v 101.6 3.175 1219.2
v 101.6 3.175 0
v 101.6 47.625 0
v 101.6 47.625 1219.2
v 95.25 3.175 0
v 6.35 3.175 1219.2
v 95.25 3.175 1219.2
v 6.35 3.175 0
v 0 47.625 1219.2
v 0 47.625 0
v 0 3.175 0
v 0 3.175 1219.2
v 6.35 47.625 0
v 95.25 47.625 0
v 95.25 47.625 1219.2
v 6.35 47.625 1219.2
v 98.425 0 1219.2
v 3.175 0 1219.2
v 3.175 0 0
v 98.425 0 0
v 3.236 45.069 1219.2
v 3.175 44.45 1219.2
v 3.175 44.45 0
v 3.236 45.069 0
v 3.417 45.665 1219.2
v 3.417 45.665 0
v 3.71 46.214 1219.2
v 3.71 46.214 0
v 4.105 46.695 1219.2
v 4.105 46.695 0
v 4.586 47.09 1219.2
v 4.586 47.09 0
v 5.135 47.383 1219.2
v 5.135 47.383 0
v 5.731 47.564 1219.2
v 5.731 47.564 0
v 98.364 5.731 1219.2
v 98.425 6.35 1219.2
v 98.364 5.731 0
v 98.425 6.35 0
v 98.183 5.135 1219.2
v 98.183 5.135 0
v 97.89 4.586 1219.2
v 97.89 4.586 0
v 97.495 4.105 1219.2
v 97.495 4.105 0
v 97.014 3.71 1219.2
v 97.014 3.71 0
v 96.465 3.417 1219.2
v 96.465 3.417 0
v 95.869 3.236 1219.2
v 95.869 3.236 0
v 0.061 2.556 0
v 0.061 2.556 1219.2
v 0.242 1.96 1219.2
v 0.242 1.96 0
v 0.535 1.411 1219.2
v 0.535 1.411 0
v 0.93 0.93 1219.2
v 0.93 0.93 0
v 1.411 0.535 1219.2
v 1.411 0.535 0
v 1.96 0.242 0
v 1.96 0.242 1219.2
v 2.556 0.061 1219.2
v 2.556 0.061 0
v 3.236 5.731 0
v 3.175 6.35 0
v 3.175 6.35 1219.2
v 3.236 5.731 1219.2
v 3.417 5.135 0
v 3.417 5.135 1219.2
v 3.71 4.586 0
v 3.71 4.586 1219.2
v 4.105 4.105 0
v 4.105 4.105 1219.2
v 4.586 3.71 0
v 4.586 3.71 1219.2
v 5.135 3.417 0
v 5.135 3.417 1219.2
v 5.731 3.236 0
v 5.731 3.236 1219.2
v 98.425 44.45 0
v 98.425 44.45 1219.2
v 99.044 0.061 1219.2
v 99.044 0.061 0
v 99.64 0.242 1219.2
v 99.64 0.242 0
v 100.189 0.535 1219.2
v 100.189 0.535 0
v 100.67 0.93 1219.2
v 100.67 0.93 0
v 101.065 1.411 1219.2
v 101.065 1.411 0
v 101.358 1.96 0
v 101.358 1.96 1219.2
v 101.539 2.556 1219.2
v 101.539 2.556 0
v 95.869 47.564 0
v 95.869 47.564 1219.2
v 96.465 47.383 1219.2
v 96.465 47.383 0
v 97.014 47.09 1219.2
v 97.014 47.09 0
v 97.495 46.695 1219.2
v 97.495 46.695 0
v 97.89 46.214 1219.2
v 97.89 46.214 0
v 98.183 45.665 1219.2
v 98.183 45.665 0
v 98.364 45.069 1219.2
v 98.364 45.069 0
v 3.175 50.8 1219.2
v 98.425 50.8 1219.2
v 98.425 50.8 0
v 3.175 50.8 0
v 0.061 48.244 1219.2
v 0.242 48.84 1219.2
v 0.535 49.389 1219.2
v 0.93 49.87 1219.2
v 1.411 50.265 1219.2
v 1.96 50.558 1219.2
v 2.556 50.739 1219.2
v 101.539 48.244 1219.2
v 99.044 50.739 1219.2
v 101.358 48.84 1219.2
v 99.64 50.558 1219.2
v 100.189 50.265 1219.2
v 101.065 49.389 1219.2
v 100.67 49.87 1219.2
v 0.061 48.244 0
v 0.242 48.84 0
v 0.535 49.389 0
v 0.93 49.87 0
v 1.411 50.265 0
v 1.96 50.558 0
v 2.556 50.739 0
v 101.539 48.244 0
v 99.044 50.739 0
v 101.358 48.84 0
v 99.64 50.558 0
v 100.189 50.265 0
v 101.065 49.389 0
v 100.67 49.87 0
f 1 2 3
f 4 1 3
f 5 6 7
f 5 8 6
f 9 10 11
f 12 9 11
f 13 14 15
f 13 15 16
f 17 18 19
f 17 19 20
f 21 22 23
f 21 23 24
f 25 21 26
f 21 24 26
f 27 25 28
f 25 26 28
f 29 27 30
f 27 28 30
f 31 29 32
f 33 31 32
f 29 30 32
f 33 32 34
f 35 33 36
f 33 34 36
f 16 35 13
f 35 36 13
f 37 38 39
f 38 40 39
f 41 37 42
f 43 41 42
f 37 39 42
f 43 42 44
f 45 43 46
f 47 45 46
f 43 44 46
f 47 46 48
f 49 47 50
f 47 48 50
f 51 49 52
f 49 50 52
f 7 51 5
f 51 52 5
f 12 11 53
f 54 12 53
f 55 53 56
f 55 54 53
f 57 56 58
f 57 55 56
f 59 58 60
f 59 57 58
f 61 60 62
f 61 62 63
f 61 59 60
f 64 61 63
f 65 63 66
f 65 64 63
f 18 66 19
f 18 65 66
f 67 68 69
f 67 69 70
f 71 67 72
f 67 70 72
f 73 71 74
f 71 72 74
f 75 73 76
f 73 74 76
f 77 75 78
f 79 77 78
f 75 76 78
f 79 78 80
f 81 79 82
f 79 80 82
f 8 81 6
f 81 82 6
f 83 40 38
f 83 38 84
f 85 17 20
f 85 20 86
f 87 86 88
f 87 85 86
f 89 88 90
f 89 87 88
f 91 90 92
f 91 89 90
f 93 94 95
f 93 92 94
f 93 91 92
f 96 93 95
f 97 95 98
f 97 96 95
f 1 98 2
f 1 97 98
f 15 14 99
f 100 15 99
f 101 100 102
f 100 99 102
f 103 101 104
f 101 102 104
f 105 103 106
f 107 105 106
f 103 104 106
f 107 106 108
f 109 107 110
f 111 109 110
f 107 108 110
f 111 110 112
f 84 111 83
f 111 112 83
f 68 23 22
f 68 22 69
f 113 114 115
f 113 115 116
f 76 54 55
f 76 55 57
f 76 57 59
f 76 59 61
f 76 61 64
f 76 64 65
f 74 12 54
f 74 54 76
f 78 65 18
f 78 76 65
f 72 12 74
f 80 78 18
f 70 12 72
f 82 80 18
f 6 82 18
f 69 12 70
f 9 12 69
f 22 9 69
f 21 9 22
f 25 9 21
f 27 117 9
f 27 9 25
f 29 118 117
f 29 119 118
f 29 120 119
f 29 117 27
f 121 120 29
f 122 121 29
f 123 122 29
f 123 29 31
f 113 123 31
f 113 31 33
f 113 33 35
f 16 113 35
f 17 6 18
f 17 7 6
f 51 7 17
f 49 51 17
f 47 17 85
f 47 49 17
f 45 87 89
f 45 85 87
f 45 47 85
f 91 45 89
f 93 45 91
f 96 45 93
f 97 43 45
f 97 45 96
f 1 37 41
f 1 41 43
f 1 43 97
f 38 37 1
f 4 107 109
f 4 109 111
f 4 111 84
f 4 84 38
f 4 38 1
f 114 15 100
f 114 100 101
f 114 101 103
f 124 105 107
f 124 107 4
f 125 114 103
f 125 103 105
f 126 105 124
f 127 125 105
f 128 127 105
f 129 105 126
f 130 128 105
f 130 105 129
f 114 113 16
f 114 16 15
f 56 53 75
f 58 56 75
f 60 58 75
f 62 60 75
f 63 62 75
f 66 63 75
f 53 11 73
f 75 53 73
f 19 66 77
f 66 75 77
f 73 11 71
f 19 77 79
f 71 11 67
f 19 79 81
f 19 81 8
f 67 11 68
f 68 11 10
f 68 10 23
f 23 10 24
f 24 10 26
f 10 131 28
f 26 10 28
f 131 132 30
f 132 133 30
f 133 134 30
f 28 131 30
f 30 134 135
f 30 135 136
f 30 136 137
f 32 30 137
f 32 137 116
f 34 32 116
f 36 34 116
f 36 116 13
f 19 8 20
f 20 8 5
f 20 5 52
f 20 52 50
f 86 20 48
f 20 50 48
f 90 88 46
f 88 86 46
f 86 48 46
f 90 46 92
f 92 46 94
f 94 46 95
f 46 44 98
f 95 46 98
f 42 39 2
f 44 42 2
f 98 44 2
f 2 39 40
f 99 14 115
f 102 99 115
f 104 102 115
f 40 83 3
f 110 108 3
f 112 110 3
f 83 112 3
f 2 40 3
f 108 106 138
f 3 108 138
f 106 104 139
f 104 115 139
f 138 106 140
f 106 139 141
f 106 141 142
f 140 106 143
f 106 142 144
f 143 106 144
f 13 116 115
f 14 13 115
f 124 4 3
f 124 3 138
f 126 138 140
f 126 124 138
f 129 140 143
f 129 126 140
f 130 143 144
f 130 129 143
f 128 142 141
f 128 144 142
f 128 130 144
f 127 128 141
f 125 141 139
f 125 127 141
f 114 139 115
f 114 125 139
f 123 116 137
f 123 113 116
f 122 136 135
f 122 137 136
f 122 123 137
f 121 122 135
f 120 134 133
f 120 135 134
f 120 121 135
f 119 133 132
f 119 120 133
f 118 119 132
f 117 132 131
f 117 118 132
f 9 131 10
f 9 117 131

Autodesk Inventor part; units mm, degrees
ref_plane "YZ Plane" through (0, 0, 0) normal (1, 0, 0) x (0, 1, 0)
ref_plane "XZ Plane" through (0, 0, 0) normal (0, 1, 0) x (-1, 0, 0)
ref_plane "XY Plane" through (0, 0, 0) normal (0, 0, 1) x (1, 0, 0)
sketch "Sketch1" plane through (0, 0, 0) normal (0, 0, 1) x (1, 0, 0)
  line L0 (0, 0) -> (101.6, 0)
  line L1 (101.6, 0) -> (101.6, 50.8)
  line L2 (101.6, 50.8) -> (0, 50.8)
  line L3 (0, 50.8) -> (0, 0)
  dimension "d0" = 101.6
  dimension "d1" = 50.8
extrude "Extrusion1" add sketch "Sketch1" along normal blind 1219.2
shell "Shell1" thickness 3.175 removed faces 2 at (67.7333, 16.9333, 0) at (67.7333, 16.9333, 1219.2)
fillet "Fillet1" radius 3.175 8 edges at (0, 50.8, 609.6) (3.175, 3.175, 609.6) (98.425, 3.175, 609.6) (3.175, 47.625, 609.6) (98.425, 47.625, 609.6) (101.6, 50.8, 609.6) (0, 0, 609.6) (101.6, 0, 609.6)
properties part number "2x3_Tube"
